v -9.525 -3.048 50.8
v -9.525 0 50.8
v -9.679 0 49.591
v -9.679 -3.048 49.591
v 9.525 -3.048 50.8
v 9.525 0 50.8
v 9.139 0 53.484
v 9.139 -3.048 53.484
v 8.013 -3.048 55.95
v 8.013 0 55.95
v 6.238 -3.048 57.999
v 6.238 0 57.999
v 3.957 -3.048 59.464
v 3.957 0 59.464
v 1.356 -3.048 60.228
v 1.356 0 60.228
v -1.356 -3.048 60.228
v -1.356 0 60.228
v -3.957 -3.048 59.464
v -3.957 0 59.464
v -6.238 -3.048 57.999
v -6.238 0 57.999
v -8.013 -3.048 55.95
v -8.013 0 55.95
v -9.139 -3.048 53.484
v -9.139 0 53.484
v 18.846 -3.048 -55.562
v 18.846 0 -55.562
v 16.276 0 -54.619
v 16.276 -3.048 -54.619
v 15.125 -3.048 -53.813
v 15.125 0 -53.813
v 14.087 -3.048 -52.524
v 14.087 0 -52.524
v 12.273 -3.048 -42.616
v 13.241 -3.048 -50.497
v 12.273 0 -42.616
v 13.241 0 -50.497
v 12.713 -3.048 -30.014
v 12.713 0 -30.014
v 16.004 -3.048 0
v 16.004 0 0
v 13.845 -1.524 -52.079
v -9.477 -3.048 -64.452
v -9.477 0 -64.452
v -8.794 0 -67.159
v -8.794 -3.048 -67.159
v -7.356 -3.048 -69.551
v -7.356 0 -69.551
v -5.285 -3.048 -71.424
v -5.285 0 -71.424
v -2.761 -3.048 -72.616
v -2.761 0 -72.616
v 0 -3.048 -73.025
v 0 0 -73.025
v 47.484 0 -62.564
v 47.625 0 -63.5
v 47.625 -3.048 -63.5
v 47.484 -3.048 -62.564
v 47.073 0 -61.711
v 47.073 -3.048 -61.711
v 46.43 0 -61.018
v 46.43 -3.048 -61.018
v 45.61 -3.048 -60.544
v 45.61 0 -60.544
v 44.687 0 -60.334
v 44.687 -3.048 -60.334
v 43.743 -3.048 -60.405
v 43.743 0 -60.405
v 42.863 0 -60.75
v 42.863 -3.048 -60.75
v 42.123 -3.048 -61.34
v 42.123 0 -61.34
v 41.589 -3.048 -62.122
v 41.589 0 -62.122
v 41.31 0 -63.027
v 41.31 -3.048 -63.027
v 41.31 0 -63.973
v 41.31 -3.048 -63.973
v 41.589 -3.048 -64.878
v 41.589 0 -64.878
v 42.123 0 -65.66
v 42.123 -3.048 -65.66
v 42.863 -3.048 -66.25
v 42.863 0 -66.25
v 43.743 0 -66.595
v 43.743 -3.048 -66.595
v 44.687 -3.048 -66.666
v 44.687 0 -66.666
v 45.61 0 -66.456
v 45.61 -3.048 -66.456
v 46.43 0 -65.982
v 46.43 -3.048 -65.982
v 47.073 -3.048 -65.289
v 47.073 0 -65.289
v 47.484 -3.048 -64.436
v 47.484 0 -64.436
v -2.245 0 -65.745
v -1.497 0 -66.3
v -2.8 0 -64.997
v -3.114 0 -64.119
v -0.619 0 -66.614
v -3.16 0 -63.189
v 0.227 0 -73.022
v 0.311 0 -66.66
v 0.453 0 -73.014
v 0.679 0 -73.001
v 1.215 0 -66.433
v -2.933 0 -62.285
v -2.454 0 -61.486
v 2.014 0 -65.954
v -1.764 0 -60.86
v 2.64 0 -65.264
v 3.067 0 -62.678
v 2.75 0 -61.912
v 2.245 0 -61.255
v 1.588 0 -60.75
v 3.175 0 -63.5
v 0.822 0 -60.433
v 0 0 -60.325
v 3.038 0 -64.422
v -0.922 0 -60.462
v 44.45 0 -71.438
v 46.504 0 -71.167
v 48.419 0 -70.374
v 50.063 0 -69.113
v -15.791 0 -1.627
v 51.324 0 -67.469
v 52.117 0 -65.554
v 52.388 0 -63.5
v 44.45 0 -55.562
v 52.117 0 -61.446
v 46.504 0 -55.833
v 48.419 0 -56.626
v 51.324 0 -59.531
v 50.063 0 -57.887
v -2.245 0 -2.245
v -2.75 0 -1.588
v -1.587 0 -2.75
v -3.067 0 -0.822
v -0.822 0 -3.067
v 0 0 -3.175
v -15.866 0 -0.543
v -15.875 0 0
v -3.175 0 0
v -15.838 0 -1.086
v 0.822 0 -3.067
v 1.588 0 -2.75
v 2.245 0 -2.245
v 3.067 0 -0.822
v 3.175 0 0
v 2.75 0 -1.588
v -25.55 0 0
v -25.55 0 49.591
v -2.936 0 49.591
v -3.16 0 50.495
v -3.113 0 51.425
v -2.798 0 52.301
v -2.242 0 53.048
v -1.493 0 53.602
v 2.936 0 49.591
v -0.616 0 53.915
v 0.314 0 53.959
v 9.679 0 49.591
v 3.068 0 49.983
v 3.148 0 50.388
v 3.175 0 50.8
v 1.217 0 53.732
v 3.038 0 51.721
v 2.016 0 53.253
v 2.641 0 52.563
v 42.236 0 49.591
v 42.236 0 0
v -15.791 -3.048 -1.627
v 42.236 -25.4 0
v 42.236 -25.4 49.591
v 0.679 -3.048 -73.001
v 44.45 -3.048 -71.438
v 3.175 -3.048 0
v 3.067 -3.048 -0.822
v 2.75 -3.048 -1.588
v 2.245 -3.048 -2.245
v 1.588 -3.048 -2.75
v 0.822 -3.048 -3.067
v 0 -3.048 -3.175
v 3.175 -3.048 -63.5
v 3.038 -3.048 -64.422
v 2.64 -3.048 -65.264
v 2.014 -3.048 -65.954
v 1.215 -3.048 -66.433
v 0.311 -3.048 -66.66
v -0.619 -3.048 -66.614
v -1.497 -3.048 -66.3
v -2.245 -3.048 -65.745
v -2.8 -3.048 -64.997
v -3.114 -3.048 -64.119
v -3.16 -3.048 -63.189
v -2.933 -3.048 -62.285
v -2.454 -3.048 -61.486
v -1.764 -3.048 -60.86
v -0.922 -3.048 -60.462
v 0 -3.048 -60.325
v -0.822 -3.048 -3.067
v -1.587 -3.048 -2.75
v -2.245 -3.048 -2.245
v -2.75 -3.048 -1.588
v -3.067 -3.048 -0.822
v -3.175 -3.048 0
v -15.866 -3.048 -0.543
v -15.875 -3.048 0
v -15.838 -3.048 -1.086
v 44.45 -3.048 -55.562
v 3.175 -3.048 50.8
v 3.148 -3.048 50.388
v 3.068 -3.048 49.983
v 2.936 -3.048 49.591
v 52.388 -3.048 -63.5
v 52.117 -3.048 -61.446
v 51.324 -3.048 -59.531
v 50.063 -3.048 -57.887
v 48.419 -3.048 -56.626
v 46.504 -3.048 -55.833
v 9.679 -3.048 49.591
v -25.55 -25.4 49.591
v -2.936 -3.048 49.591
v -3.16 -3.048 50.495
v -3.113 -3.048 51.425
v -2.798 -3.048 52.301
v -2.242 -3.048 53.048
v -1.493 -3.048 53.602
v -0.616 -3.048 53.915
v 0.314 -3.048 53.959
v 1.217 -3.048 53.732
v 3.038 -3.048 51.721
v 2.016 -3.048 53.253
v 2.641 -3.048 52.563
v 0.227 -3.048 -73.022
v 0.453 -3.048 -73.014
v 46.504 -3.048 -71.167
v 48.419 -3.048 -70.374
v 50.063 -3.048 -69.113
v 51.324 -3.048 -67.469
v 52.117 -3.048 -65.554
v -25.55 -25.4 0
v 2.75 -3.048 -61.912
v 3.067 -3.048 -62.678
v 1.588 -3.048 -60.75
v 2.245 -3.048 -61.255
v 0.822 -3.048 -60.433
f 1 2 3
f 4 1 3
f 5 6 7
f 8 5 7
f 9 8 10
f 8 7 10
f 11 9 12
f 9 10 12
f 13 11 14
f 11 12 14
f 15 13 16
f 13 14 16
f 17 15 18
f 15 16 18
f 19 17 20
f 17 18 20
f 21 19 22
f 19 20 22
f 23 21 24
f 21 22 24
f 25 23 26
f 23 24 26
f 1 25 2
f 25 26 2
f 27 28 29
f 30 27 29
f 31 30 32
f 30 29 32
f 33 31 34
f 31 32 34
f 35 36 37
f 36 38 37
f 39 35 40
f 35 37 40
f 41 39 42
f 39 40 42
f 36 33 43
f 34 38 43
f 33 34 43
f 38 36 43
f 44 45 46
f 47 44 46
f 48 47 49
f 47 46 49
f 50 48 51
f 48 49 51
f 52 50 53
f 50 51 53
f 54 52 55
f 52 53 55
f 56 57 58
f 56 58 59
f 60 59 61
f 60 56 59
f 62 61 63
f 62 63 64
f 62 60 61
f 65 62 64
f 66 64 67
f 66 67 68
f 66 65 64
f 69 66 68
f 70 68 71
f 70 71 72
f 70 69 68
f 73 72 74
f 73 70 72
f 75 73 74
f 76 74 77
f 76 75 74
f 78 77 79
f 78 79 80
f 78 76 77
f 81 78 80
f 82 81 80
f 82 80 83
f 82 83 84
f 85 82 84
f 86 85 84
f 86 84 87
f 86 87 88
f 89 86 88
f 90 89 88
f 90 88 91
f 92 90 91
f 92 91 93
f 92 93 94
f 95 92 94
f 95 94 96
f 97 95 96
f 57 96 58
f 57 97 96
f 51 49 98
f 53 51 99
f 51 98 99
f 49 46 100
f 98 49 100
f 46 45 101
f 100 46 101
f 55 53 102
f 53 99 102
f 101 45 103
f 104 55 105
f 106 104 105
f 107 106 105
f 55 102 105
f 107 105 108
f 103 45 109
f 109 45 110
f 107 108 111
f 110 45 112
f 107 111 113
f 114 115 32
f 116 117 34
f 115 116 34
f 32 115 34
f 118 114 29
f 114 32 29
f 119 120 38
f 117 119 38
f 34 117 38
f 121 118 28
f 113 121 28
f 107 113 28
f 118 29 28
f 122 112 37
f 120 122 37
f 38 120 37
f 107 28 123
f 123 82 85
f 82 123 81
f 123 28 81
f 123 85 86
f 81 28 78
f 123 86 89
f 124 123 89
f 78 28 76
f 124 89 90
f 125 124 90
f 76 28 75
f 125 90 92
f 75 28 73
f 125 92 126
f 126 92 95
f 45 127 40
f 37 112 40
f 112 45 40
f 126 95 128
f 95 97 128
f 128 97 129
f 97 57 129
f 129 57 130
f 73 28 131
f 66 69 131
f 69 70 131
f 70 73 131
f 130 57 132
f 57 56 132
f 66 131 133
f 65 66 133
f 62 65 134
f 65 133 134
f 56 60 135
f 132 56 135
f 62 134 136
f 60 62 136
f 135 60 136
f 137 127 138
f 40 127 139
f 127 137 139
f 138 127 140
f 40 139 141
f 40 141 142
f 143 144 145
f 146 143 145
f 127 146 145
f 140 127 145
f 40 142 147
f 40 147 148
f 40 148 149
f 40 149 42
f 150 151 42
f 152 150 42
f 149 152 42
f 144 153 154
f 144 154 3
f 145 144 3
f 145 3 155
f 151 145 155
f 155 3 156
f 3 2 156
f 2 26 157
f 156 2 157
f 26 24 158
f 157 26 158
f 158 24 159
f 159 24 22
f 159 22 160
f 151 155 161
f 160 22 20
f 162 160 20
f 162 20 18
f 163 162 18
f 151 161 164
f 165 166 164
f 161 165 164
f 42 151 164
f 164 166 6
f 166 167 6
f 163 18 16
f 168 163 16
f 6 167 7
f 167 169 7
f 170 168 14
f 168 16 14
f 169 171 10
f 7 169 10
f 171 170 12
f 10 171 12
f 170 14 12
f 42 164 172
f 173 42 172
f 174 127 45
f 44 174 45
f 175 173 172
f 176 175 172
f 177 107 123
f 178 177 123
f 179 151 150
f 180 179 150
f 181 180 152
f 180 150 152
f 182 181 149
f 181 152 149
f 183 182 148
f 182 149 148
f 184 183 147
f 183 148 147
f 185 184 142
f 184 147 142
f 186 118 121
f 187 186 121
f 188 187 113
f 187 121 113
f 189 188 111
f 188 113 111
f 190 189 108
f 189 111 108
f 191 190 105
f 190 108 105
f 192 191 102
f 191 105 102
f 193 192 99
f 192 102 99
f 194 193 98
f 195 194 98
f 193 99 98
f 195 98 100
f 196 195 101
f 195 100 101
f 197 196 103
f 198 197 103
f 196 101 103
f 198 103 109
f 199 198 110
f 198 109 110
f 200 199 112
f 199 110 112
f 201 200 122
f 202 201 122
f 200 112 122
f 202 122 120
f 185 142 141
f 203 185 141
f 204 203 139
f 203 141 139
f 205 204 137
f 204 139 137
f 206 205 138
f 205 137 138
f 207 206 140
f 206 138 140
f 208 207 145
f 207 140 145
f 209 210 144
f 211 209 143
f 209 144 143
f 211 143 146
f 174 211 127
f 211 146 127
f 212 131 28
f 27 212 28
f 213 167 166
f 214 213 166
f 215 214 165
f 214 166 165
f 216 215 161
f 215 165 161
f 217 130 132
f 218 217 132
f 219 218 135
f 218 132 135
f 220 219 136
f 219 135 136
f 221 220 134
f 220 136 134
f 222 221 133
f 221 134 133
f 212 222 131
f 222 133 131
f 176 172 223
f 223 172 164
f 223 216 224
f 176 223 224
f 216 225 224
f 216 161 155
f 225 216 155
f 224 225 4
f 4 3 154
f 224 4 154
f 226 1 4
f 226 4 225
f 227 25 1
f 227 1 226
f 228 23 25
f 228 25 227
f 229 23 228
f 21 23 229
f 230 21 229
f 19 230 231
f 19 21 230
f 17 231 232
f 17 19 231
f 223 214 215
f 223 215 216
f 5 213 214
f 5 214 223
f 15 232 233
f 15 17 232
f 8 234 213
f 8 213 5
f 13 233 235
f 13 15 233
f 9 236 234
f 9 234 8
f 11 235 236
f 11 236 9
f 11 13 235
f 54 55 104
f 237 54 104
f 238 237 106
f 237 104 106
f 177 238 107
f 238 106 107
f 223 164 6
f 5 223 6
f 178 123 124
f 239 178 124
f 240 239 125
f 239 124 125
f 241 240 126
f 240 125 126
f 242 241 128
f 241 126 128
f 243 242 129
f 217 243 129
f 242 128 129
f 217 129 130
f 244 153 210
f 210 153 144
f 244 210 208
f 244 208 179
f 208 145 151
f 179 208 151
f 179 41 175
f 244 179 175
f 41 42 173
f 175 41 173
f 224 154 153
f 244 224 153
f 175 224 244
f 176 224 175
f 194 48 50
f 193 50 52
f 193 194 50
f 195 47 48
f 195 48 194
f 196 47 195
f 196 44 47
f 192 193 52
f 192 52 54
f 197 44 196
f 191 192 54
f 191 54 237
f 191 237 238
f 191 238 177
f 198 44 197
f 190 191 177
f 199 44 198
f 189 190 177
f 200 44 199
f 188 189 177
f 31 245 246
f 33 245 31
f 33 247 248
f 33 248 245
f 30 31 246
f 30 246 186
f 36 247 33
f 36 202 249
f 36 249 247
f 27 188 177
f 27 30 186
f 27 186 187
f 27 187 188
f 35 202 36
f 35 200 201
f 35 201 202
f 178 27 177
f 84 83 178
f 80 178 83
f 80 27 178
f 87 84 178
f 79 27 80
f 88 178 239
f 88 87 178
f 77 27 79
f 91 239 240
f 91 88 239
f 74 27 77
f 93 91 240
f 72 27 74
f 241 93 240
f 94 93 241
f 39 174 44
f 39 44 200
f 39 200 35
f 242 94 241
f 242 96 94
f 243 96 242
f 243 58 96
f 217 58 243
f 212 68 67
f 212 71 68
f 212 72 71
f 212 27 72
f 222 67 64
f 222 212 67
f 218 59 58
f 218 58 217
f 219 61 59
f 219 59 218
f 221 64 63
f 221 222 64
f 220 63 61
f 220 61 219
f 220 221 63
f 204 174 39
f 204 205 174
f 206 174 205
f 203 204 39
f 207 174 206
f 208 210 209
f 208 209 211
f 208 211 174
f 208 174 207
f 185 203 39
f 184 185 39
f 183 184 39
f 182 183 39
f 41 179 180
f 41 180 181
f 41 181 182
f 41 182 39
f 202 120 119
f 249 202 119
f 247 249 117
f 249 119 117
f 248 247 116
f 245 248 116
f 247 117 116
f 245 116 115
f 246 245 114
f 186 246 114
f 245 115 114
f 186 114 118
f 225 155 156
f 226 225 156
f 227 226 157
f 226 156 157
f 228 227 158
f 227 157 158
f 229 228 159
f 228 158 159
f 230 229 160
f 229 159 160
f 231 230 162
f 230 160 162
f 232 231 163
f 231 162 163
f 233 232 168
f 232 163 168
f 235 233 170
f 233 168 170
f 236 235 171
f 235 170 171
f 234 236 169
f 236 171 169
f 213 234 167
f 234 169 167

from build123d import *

# Parameters (mm, degrees)
F0_R     = 1.5875
F0_R_2   = 3.175
F1_DEPTH = 3.048
F3_DEPTH = 25.4


with BuildPart() as f1:
    # F0 (on Front) → F1 (new body)
    with BuildSketch(Plane.XZ):
        with BuildLine():
            ThreePointArc((0, -15.875), (11.2253201513, -11.2253201513), (15.875, 0))
            ThreePointArc((15.875, 0), (15.8430821306, 1.0061677811), (15.7474568688, 2.0082896118))
            ThreePointArc((15.7474568688, 2.0082896118), (10.4912827484, 11.9142188705), (0, 15.875))
            Line((0, 15.875), (0, 3.175))
            ThreePointArc((0, 3.175), (2.2450640303, 2.2450640303), (3.175, 0))
            ThreePointArc((3.175, 0), (2.2450640303, -2.2450640303), (0, -3.175))
            Line((0, -3.175), (0, -15.875))
        make_face()
        with BuildLine():
            ThreePointArc((15.7474568688, 2.0082896118), (15.8430821306, 1.0061677811), (15.875, 0))
            ThreePointArc((15.875, 0), (11.2253201513, -11.2253201513), (0, -15.875))
            Line((0, -15.875), (0, -53.975))
            ThreePointArc((0, -53.975), (6.7351920908, -56.7648079092), (9.525, -63.5))
            ThreePointArc((9.525, -63.5), (6.9712901065, -69.9905114784), (0.6794904459, -73.0007324841))
            Line((0.6794904459, -73.0007324841), (44.45, -71.4375))
            ThreePointArc((44.45, -71.4375), (36.5125, -63.5), (44.45, -55.5625))
            Line((44.45, -55.5625), (18.8464820385, -55.5625))
            add(Edge.make_bspline(
                [(18.8464820385, -55.5625), (16.9357606523, -55.0097091598), (9.4372158473, -52.8403050213), (13.1997682789, -22.5625848825), (16.0035761028, 0)],
                knots=[0, 0, 0, 0, 0.2548122917, 1, 1, 1, 1], degree=3))
            Line((16.0035761028, 0), (15.7474568688, 2.0082896118))
        make_face()
        with BuildLine():
            ThreePointArc((0, 15.875), (10.4912827484, 11.9142188705), (15.7474568688, 2.0082896118))
            Line((15.7474568688, 2.0082896118), (9.525, 50.8))
            ThreePointArc((9.525, 50.8), (6.7351920908, 44.0648079092), (0, 41.275))
            Line((0, 41.275), (0, 15.875))
        make_face()
        with BuildLine():
            Line((0, -53.975), (0, -15.875))
            ThreePointArc((0, -15.875), (-10.634629101, -11.7864451335), (-15.7914295954, -1.6267686783))
            Line((-15.7914295954, -1.6267686783), (-9.4772560787, -64.4524926348))
            ThreePointArc((-9.4772560787, -64.4524926348), (-7.0639265761, -57.1104330094), (0, -53.975))
        make_face()
        with BuildLine():
            ThreePointArc((-15.7914295954, -1.6267686783), (-10.634629101, -11.7864451335), (0, -15.875))
            Line((0, -15.875), (0, -3.175))
            ThreePointArc((0, -3.175), (-3.175, 0), (0, 3.175))
            Line((0, 3.175), (0, 15.875))
            ThreePointArc((0, 15.875), (-10.4912827447, 11.9142188737), (-15.7474568676, 2.0082896216))
            ThreePointArc((-15.7474568676, 2.0082896216), (-15.8738386045, 0.192023326), (-15.7914295954, -1.6267686783))
        make_face()
        with BuildLine():
            ThreePointArc((-15.7474568676, 2.0082896216), (-10.4912827447, 11.9142188737), (0, 15.875))
            Line((0, 15.875), (0, 41.275))
            ThreePointArc((0, 41.275), (-6.7351920908, 44.0648079092), (-9.525, 50.8))
            Line((-9.525, 50.8), (-15.7474568676, 2.0082896216))
        make_face()
        with Locations((-1.9409962697, 36.5252)):
            Circle(F0_R, mode=Mode.SUBTRACT)
        with BuildLine():
            ThreePointArc((0, 41.275), (6.7351920908, 44.0648079092), (9.525, 50.8))
            ThreePointArc((9.525, 50.8), (0, 60.325), (-9.525, 50.8))
            ThreePointArc((-9.525, 50.8), (-6.7351920908, 44.0648079092), (0, 41.275))
        make_face()
        with BuildLine():
            ThreePointArc((3.175, 50.8), (2.2450640303, 48.5549359697), (0, 47.625))
            ThreePointArc((0, 47.625), (-2.2450640303, 53.0450640303), (3.175, 50.8))
        make_face(mode=Mode.SUBTRACT)
        with BuildLine():
            ThreePointArc((9.525, -63.5), (6.7351920908, -56.7648079092), (0, -53.975))
            ThreePointArc((0, -53.975), (-7.0639265761, -57.1104330094), (-9.4772560787, -64.4524926348))
            ThreePointArc((-9.4772560787, -64.4524926348), (-6.3895669906, -70.5639265761), (0, -73.025))
            Line((0, -73.025), (0.6794904459, -73.0007324841))
            ThreePointArc((0.6794904459, -73.0007324841), (6.9712901065, -69.9905114784), (9.525, -63.5))
        make_face()
        with BuildLine():
            ThreePointArc((3.175, -63.5), (-2.2450640303, -65.7450640303), (0, -60.325))
            ThreePointArc((0, -60.325), (2.2450640303, -61.2549359697), (3.175, -63.5))
        make_face(mode=Mode.SUBTRACT)
        with BuildLine():
            ThreePointArc((52.3875, -63.5), (50.0626600757, -57.8873399243), (44.45, -55.5625))
            ThreePointArc((44.45, -55.5625), (36.5125, -63.5), (44.45, -71.4375))
            ThreePointArc((44.45, -71.4375), (50.0626600757, -69.1126600757), (52.3875, -63.5))
        make_face()
        with Locations((44.45, -63.5)):
            Circle(F0_R_2, mode=Mode.SUBTRACT)
        with BuildLine():
            Line((0.6794904459, -73.0007324841), (0, -73.025))
            ThreePointArc((0, -73.025), (0.3399618281, -73.0189311877), (0.6794904459, -73.0007324841))
        make_face()
    extrude(amount=F1_DEPTH)

    # F2 (on Front) → F3 (join)
    with BuildSketch(Plane.XZ):
        Polygon((42.2361642122, 49.5914518833), (-25.550276041, 49.5914518833), (-25.550276041, 0), (42.2361642122, 0), (42.2361642122, 47.7479062974), align=None)
    extrude(amount=F3_DEPTH)


solid = f1.part
